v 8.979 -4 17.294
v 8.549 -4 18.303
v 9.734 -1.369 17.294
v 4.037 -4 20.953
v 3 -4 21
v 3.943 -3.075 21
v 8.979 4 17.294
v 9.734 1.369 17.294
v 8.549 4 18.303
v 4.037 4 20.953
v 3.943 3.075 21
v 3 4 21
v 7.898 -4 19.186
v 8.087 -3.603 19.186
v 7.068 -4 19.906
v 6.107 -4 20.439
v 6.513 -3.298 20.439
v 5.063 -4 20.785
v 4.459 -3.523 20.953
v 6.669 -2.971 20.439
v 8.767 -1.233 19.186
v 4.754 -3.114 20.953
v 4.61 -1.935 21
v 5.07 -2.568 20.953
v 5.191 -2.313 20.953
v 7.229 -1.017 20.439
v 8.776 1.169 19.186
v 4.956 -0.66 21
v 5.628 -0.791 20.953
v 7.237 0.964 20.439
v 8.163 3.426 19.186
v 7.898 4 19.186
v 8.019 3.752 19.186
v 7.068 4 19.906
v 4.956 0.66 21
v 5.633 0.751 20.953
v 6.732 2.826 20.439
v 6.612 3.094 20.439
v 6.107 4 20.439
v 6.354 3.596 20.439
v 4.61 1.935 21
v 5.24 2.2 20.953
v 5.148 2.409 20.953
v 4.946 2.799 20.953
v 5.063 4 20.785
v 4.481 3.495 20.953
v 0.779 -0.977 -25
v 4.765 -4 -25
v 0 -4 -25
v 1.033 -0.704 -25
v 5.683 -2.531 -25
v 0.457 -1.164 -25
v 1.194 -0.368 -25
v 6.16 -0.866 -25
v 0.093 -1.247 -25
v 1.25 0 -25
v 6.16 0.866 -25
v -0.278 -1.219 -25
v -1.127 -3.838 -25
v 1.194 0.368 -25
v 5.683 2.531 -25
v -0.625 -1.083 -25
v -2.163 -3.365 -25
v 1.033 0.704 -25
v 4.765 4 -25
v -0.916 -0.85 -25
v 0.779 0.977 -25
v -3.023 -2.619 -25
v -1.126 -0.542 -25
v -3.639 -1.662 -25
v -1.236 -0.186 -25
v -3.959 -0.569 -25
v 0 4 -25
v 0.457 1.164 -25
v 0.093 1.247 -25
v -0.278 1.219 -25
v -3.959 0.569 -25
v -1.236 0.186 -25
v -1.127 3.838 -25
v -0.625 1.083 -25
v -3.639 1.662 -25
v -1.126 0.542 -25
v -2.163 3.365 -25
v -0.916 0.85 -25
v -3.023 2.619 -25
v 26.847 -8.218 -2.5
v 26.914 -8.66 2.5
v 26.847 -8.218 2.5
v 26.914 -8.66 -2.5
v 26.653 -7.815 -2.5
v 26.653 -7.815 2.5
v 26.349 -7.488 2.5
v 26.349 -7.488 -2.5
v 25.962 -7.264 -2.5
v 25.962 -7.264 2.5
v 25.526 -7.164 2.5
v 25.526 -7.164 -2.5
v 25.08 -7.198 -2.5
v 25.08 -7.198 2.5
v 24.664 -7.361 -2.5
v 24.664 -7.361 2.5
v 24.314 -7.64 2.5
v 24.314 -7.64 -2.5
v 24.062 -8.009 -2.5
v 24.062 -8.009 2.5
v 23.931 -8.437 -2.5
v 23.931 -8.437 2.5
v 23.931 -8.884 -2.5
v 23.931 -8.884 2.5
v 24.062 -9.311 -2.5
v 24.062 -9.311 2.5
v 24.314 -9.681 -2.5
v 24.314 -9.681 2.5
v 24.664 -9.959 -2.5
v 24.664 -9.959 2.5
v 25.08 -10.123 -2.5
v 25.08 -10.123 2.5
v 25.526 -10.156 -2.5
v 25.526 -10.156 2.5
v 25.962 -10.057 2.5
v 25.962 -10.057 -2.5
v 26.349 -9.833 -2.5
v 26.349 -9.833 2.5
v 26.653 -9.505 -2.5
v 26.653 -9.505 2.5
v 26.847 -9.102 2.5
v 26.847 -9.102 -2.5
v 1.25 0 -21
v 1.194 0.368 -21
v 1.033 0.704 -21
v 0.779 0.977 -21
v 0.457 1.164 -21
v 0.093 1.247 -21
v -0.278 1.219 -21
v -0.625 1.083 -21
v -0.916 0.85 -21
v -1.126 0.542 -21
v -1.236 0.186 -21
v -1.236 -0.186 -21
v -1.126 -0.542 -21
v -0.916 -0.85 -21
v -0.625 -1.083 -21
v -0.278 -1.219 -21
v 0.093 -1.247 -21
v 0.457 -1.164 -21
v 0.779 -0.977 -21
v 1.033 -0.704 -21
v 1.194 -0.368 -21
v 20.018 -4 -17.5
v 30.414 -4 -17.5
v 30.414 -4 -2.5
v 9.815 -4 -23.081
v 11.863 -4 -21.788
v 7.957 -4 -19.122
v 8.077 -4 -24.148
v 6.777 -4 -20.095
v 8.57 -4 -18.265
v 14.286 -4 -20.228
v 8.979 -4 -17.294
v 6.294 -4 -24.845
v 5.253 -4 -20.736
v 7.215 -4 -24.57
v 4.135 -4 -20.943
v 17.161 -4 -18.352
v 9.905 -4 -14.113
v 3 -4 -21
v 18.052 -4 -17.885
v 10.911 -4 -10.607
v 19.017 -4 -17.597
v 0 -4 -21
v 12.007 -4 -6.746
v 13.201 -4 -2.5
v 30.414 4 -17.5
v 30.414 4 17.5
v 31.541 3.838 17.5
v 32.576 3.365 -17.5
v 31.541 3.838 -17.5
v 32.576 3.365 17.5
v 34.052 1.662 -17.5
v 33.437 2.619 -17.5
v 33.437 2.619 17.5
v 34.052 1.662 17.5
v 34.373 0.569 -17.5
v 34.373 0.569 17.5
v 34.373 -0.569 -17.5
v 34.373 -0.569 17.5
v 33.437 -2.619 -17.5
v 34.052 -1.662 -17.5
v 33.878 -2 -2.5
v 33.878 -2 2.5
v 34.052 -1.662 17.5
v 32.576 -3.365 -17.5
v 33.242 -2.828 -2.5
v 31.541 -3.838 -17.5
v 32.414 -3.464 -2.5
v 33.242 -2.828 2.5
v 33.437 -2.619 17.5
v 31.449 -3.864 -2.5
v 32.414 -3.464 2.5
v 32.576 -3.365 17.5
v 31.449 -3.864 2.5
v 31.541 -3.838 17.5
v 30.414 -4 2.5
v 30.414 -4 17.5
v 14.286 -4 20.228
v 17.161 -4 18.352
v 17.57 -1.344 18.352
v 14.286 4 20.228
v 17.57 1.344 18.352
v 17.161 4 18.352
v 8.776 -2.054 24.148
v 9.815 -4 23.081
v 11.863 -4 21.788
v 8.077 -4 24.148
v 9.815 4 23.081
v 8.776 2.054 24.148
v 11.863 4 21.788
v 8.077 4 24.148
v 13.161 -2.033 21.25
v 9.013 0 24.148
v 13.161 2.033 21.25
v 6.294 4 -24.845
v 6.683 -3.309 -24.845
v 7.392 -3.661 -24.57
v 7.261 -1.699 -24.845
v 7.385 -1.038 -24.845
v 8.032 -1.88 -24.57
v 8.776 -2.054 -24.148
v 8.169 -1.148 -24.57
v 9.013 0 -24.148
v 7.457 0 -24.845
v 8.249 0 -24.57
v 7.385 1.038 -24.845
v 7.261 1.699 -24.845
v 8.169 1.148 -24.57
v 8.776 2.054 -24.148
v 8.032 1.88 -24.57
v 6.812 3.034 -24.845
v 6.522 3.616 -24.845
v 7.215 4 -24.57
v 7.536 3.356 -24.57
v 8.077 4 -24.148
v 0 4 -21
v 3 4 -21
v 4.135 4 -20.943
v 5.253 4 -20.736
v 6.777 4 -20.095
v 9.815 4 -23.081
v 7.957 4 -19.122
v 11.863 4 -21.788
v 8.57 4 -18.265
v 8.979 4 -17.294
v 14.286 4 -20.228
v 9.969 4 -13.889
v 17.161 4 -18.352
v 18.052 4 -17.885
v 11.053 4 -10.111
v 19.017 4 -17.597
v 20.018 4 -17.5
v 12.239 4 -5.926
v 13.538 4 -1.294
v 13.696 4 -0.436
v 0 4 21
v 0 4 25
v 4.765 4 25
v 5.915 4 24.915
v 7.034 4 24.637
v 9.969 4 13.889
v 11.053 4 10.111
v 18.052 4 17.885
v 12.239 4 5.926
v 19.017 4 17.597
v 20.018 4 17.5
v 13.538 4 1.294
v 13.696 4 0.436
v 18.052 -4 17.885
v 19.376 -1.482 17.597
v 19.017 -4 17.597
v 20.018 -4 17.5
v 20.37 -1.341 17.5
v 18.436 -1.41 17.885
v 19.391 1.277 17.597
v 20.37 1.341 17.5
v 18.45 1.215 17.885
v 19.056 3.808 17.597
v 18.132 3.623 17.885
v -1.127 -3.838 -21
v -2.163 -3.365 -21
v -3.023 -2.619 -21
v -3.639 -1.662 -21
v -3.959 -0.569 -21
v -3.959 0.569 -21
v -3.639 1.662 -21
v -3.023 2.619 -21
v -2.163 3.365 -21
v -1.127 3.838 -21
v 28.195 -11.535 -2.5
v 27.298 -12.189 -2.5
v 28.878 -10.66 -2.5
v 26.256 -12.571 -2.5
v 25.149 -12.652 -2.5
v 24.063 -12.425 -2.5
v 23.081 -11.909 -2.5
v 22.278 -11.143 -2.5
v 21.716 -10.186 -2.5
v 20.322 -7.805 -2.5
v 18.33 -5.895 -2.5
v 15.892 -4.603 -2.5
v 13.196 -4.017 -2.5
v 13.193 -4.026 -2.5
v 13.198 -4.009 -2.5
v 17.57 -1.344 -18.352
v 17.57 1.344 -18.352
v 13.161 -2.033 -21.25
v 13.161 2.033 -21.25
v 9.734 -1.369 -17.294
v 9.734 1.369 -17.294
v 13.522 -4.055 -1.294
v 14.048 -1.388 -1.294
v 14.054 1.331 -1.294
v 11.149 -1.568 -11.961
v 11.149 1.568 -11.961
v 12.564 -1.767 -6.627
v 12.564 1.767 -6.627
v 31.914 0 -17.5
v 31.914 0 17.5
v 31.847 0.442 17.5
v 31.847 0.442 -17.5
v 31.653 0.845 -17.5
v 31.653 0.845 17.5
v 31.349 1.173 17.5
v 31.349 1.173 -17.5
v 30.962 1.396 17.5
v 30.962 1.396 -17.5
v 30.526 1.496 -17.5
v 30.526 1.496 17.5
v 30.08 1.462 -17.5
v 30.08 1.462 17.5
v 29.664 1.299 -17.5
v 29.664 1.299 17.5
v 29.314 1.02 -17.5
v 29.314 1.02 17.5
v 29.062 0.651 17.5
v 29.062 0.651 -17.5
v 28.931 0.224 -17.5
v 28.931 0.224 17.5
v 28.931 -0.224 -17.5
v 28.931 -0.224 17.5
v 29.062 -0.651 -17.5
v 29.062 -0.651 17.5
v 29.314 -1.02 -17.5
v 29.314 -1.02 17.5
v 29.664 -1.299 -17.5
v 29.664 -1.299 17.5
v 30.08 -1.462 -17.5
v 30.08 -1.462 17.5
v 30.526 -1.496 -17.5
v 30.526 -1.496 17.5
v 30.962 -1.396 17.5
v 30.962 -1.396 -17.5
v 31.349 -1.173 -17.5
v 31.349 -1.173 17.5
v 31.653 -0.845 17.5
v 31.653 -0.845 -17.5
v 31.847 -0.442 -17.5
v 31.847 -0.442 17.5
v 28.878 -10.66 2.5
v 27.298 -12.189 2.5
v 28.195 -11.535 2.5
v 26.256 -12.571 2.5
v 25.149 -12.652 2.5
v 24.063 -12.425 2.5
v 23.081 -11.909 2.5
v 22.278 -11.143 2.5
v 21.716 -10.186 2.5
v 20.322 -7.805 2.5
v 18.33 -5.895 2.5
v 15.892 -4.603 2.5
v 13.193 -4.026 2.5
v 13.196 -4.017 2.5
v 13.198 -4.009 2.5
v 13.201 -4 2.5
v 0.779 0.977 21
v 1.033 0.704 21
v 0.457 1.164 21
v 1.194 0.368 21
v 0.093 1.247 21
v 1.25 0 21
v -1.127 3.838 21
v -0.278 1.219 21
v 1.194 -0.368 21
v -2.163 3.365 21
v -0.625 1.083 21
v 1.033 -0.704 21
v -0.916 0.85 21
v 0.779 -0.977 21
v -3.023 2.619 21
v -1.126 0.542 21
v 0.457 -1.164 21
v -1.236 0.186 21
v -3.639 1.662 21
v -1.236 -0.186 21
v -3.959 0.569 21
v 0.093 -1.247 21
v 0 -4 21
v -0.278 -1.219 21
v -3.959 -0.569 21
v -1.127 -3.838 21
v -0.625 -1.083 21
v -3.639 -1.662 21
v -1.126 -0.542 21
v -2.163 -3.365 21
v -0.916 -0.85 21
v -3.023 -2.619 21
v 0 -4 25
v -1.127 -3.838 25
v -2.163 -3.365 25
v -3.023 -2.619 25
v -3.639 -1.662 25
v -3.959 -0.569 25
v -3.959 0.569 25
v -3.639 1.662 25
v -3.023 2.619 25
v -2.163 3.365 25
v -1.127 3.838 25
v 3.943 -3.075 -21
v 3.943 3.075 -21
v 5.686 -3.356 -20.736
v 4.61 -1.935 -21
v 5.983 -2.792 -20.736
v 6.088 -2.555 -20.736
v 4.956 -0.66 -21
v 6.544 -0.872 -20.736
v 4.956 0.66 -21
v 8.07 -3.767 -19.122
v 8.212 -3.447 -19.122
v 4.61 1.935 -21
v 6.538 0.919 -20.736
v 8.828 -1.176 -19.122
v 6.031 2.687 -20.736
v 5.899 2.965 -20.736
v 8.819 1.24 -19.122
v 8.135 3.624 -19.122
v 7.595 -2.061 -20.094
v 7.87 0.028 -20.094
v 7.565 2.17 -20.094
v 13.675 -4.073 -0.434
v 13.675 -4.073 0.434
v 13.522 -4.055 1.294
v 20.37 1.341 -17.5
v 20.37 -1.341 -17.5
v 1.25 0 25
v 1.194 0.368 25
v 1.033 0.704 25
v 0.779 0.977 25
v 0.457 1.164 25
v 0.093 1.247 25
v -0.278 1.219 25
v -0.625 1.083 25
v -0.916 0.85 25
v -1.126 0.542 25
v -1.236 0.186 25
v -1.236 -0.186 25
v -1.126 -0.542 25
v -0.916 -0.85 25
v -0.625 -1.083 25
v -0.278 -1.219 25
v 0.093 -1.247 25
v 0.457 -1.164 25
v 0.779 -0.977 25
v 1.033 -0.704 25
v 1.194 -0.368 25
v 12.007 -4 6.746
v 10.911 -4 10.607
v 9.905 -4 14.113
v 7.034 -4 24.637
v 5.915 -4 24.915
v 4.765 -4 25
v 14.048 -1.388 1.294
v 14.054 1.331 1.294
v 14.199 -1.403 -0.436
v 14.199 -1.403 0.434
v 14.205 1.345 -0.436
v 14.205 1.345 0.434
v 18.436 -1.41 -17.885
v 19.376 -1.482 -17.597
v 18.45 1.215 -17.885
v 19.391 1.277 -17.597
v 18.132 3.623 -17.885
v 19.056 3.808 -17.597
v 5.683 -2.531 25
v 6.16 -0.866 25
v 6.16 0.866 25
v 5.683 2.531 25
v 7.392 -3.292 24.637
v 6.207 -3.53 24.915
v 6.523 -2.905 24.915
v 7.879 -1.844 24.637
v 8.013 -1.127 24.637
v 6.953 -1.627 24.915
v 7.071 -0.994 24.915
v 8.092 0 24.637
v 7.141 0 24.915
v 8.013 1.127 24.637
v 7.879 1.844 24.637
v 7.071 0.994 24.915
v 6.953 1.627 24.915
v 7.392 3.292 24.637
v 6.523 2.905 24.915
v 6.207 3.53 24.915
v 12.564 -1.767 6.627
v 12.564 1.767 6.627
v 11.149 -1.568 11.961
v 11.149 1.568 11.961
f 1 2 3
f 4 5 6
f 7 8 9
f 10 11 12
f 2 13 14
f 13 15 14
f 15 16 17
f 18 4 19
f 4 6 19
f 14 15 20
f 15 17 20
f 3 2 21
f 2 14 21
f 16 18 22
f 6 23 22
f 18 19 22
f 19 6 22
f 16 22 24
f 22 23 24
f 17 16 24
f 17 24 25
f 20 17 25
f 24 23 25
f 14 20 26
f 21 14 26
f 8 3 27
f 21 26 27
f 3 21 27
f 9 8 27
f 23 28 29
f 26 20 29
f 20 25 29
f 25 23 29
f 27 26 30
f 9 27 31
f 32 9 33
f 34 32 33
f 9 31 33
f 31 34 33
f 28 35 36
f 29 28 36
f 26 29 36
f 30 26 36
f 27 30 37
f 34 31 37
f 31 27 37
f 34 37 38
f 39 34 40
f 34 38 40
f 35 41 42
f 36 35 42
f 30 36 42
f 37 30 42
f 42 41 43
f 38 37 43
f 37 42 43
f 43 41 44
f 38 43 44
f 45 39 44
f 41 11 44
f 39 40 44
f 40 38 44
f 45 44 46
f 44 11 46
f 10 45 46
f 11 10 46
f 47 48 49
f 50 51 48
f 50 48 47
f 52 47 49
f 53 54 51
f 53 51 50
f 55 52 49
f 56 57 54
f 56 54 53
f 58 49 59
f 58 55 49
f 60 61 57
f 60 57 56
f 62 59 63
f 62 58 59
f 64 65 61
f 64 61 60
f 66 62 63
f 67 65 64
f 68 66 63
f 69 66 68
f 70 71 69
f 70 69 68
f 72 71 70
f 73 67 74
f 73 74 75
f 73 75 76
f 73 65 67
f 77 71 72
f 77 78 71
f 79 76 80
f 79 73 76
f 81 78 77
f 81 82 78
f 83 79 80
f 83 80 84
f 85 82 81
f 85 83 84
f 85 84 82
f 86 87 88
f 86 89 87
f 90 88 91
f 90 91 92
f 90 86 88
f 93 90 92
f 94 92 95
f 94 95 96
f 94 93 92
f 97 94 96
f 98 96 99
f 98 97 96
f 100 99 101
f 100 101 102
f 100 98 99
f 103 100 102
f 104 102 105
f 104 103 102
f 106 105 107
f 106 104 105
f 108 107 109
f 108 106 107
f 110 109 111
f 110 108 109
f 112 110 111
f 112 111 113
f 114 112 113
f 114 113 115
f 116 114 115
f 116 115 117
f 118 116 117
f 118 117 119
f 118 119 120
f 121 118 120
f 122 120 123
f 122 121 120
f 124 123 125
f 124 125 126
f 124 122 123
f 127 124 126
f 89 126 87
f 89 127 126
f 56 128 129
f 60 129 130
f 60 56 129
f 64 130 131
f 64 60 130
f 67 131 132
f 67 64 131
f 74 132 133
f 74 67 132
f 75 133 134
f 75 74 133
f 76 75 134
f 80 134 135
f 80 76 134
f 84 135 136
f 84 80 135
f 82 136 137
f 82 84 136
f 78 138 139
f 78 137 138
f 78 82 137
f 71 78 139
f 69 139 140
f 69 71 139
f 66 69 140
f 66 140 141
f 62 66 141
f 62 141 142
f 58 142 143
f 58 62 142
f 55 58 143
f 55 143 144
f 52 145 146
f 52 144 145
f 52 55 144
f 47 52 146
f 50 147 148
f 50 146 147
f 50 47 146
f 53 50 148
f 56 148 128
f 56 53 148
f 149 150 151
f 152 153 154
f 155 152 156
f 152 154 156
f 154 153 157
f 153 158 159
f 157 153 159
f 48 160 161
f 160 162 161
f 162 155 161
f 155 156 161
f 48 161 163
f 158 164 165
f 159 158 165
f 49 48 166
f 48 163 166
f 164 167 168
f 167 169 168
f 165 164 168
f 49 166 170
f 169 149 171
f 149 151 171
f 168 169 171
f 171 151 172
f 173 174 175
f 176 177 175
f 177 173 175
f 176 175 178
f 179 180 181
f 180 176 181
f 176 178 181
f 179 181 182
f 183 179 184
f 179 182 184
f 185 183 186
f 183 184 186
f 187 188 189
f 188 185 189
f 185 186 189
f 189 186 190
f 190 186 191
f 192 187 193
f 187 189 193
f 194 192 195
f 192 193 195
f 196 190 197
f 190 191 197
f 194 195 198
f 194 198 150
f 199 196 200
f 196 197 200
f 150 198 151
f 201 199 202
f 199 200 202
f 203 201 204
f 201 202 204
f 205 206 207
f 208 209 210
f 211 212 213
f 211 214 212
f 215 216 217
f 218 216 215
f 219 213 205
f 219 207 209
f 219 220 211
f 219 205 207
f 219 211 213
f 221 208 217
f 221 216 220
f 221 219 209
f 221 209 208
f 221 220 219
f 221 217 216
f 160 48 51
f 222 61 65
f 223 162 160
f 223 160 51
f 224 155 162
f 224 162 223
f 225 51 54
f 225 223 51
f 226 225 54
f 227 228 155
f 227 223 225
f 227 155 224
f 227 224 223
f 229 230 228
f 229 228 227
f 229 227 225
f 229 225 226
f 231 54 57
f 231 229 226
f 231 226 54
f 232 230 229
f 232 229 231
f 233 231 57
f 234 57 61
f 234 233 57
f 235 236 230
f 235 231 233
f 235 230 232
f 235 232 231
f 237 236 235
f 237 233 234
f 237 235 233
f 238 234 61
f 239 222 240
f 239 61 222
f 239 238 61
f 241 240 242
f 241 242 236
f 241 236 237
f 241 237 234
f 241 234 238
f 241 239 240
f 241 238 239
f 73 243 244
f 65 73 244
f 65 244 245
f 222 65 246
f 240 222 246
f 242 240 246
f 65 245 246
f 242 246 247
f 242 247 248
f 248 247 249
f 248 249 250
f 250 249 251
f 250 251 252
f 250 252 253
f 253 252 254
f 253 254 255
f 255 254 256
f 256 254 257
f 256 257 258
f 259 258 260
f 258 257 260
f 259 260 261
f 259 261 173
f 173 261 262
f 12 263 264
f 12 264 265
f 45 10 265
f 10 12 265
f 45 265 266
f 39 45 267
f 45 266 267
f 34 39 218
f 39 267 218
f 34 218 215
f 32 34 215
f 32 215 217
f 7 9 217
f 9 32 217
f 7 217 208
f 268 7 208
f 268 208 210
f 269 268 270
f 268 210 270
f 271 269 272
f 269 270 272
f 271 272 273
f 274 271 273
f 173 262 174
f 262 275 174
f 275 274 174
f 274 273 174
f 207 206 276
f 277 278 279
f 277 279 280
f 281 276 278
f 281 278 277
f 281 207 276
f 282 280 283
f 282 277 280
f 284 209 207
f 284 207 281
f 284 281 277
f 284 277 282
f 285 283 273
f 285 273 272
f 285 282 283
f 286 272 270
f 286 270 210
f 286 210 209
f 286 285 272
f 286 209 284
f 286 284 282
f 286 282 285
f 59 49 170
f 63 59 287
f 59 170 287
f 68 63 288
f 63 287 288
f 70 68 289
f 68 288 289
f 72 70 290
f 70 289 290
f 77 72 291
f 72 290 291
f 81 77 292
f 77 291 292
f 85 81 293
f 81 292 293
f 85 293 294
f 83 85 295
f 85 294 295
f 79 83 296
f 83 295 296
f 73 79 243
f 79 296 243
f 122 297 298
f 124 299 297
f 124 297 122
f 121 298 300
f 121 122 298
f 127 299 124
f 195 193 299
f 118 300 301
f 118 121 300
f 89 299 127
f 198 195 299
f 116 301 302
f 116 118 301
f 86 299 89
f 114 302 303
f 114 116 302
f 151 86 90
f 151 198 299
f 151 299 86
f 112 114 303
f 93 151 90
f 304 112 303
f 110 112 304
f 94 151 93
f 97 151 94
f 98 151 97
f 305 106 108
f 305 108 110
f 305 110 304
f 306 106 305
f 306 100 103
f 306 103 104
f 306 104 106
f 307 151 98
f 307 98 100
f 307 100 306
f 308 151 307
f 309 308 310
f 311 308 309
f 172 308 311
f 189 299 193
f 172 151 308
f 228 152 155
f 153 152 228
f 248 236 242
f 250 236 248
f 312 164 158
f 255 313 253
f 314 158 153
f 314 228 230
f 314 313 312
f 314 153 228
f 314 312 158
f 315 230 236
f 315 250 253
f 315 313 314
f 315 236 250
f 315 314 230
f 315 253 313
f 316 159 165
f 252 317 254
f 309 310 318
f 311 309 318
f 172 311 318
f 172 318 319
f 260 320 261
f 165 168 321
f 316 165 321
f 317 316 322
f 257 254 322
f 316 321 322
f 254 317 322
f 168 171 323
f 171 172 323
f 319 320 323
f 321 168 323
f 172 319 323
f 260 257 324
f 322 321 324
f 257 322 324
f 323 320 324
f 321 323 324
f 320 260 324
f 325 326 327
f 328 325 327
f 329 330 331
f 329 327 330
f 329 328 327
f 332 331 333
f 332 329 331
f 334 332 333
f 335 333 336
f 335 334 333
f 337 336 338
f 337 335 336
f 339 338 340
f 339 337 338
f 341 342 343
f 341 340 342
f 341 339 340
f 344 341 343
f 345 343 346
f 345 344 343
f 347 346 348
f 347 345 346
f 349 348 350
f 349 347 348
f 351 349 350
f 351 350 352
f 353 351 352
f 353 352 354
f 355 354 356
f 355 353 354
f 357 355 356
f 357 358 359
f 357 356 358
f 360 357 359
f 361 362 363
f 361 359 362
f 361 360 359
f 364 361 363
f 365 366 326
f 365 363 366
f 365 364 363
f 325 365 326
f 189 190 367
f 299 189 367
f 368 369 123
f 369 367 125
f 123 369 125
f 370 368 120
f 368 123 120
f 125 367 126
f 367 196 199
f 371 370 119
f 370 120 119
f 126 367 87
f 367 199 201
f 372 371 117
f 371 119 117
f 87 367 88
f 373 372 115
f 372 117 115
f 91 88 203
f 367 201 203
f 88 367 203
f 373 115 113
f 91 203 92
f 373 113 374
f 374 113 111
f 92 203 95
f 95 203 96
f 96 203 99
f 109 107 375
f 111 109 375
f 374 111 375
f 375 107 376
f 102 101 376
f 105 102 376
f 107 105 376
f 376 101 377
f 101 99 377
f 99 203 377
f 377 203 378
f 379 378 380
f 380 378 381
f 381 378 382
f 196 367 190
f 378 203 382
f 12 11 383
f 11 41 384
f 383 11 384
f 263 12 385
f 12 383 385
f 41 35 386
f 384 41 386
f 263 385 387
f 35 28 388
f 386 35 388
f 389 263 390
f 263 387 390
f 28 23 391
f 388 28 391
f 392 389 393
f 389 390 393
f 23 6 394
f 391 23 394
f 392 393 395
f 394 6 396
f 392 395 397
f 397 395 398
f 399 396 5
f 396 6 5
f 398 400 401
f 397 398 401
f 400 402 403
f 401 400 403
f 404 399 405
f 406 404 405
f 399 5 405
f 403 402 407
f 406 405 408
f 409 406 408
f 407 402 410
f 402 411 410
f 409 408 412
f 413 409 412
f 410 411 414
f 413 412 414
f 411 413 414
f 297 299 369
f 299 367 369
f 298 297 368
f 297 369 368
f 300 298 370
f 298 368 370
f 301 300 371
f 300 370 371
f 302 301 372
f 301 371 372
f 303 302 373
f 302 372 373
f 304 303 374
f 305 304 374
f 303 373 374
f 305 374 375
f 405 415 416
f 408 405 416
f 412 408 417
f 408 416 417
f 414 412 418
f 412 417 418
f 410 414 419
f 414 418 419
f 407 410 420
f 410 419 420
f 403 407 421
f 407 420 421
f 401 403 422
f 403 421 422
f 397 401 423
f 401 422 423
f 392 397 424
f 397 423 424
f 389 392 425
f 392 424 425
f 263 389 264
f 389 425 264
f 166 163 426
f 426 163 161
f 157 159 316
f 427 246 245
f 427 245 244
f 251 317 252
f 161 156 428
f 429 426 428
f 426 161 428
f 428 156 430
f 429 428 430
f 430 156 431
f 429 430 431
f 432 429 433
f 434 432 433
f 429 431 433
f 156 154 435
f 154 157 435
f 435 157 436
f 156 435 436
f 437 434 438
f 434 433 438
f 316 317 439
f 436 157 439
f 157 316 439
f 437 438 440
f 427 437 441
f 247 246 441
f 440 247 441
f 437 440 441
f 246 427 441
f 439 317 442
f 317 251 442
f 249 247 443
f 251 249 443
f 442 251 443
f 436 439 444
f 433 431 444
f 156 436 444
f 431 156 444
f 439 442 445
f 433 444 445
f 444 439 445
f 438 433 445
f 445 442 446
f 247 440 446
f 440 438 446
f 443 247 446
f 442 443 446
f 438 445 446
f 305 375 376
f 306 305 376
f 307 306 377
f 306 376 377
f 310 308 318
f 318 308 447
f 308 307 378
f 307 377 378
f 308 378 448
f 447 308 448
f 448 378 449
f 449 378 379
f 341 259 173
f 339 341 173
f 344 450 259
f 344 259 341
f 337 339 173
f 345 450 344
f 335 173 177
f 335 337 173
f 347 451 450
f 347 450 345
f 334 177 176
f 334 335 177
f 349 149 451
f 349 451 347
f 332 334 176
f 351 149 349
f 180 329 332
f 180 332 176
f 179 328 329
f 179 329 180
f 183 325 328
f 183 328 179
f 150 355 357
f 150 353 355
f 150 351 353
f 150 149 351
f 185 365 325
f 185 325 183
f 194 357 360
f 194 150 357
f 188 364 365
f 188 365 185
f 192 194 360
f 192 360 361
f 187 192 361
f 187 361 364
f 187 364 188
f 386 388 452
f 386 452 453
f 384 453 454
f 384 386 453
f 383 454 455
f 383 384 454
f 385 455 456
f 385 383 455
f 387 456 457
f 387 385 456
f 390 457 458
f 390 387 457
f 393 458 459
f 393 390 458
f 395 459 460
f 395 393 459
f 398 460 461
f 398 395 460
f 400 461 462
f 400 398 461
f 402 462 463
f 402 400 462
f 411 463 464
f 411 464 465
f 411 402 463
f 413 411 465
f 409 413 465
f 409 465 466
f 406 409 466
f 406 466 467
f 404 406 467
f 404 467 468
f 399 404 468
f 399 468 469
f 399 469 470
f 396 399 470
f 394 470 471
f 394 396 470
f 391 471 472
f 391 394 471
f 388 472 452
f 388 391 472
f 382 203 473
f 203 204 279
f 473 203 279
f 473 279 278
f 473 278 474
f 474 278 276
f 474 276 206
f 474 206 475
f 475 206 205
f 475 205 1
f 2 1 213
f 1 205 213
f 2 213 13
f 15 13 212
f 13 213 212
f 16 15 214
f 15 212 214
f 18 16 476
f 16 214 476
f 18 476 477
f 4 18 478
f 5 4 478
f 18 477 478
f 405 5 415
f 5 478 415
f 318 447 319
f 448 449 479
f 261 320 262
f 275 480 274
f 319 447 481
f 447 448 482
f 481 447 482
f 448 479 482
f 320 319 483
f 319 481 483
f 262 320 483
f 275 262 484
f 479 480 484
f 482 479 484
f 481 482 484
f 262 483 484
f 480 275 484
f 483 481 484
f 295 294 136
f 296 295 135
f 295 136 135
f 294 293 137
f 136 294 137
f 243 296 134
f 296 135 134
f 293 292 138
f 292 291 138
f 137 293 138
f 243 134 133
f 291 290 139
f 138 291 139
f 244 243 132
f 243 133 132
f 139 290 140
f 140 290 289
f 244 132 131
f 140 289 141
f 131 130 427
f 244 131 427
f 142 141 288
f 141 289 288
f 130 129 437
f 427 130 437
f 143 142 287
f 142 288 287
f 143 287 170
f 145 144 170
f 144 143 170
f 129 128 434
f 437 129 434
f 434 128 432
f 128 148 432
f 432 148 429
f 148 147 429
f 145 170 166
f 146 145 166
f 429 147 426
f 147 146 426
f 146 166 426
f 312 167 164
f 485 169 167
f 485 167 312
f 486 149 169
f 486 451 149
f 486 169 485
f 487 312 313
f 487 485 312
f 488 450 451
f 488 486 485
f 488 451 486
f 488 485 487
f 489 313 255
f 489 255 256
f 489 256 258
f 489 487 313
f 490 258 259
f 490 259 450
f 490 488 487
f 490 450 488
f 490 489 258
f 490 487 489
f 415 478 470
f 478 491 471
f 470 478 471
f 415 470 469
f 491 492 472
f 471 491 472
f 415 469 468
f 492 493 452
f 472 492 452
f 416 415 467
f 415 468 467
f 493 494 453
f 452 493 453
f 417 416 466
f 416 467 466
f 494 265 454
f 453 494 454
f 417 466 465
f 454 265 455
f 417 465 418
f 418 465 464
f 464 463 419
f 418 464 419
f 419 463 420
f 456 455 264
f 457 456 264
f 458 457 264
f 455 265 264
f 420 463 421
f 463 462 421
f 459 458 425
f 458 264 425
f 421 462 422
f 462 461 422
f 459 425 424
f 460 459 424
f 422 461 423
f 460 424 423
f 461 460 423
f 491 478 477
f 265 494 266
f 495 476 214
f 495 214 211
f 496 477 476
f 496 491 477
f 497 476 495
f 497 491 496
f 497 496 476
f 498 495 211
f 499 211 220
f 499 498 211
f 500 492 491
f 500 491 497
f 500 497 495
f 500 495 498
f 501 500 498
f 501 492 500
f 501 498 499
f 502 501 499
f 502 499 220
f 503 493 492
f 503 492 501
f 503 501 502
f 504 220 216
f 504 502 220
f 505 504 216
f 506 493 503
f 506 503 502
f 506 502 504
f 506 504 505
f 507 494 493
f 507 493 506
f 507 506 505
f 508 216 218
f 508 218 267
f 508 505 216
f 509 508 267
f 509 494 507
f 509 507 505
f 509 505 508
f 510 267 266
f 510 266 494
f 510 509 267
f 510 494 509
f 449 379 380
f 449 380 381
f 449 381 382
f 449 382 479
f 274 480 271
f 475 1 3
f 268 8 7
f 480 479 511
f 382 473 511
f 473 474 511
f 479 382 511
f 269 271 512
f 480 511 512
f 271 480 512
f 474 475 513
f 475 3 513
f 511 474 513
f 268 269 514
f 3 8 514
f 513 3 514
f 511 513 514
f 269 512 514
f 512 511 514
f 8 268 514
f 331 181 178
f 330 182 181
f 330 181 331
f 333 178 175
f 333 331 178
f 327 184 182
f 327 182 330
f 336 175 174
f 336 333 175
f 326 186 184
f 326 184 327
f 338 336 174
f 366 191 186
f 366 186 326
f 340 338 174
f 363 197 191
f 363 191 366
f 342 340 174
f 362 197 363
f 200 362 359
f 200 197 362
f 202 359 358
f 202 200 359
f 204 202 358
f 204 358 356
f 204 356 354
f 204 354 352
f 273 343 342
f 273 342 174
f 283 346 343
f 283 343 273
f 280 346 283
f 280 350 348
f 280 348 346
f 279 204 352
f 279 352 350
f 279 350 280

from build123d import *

# Parameters (mm, degrees)
ESQUISSE1_R        = 1.25
ESQUISSE1_R_2      = 1.5
BOSS_EXTRU_1_DEPTH = 25
ESQUISSE3_R        = 1.5
BOSS_EXTRU_2_DEPTH = 2.5


with BuildPart() as part:
    # Esquisse1 → Boss.-Extru.1 (new, symmetric)
    with BuildSketch(Plane.XY):
        with BuildLine():
            Line((0, 4), (30.413812651, 4))
            ThreePointArc((30.413812651, 4), (34.413812651, 0), (30.413812651, -4))
            Line((30.413812651, -4), (0, -4))
            ThreePointArc((0, -4), (-4, 0), (0, 4))
        make_face()
        Circle(ESQUISSE1_R, mode=Mode.SUBTRACT)
        with Locations((30.413812651, 0)):
            Circle(ESQUISSE1_R_2, mode=Mode.SUBTRACT)
    extrude(amount=BOSS_EXTRU_1_DEPTH, both=True)

    # Esquisse3 → Boss.-Extru.2 (add, symmetric)
    with BuildSketch(Plane.XY):
        with BuildLine():
            Line((33.877914267, -2), (28.877914267, -10.660254038))
            ThreePointArc((28.877914267, -10.660254038), (25.149451096, -12.651508599), (21.716189443, -10.185895741))
            ThreePointArc((21.716189443, -10.185895741), (18.033559179, -5.689132338), (12.472131421, -4))
            Line((12.472131421, -4), (30.413812651, -4))
            ThreePointArc((30.413812651, -4), (32.413812651, -3.464101615), (33.877914267, -2))
        make_face()
        with Locations((25.413812651, -8.660254038)):
            Circle(ESQUISSE3_R, mode=Mode.SUBTRACT)
    extrude(amount=BOSS_EXTRU_2_DEPTH, both=True)

    # Esquisse4 → Enlèvement de matière-Révolution1 (revolve, cut)
    with BuildSketch(Plane(origin=(0, 0, 0), x_dir=(1, 0, 0), z_dir=(0, 1, 0))):
        with BuildLine():
            Line((0, 21), (5, 21))
            ThreePointArc((5, 21), (8.043807145, 19.966766701), (9.829629131, 17.294095226))
            Line((9.829629131, 17.294095226), (14.11681621, 1.294095226))
            ThreePointArc((14.11681621, 1.294095226), (14.287187079, 0), (14.11681621, -1.294095226))
            Line((14.11681621, -1.294095226), (9.829629131, -17.294095226))
            ThreePointArc((9.829629131, -17.294095226), (8.043807145, -19.966766701), (5, -21))
            Line((5, -21), (0, -21))
            Line((0, -21), (0, 21))
        make_face()
        with BuildLine():
            Line((34.413812651, 25), (6.221001618, 25))
            ThreePointArc((6.221001618, 25), (7.680759567, 24.782165485), (9.01332325, 24.147642692))
            Line((9.01332325, 24.147642692), (17.621491019, 18.352357308))
            ThreePointArc((17.621491019, 18.352357308), (18.954054703, 17.717834515), (20.413812651, 17.5))
            Line((20.413812651, 17.5), (34.413812651, 17.5))
            Line((34.413812651, 17.5), (34.413812651, 25))
        make_face()
        with BuildLine():
            Line((17.621491019, -18.352357308), (9.01332325, -24.147642692))
            ThreePointArc((9.01332325, -24.147642692), (7.680759567, -24.782165485), (6.221001618, -25))
            Line((6.221001618, -25), (34.413812651, -25))
            Line((34.413812651, -25), (34.413812651, -17.5))
            Line((34.413812651, -17.5), (20.413812651, -17.5))
            ThreePointArc((20.413812651, -17.5), (18.954054703, -17.717834515), (17.621491019, -18.352357308))
        make_face()
    revolve(axis=Axis((0, 0, -21), (0, 0, 1)), mode=Mode.SUBTRACT)


solid = part.part
